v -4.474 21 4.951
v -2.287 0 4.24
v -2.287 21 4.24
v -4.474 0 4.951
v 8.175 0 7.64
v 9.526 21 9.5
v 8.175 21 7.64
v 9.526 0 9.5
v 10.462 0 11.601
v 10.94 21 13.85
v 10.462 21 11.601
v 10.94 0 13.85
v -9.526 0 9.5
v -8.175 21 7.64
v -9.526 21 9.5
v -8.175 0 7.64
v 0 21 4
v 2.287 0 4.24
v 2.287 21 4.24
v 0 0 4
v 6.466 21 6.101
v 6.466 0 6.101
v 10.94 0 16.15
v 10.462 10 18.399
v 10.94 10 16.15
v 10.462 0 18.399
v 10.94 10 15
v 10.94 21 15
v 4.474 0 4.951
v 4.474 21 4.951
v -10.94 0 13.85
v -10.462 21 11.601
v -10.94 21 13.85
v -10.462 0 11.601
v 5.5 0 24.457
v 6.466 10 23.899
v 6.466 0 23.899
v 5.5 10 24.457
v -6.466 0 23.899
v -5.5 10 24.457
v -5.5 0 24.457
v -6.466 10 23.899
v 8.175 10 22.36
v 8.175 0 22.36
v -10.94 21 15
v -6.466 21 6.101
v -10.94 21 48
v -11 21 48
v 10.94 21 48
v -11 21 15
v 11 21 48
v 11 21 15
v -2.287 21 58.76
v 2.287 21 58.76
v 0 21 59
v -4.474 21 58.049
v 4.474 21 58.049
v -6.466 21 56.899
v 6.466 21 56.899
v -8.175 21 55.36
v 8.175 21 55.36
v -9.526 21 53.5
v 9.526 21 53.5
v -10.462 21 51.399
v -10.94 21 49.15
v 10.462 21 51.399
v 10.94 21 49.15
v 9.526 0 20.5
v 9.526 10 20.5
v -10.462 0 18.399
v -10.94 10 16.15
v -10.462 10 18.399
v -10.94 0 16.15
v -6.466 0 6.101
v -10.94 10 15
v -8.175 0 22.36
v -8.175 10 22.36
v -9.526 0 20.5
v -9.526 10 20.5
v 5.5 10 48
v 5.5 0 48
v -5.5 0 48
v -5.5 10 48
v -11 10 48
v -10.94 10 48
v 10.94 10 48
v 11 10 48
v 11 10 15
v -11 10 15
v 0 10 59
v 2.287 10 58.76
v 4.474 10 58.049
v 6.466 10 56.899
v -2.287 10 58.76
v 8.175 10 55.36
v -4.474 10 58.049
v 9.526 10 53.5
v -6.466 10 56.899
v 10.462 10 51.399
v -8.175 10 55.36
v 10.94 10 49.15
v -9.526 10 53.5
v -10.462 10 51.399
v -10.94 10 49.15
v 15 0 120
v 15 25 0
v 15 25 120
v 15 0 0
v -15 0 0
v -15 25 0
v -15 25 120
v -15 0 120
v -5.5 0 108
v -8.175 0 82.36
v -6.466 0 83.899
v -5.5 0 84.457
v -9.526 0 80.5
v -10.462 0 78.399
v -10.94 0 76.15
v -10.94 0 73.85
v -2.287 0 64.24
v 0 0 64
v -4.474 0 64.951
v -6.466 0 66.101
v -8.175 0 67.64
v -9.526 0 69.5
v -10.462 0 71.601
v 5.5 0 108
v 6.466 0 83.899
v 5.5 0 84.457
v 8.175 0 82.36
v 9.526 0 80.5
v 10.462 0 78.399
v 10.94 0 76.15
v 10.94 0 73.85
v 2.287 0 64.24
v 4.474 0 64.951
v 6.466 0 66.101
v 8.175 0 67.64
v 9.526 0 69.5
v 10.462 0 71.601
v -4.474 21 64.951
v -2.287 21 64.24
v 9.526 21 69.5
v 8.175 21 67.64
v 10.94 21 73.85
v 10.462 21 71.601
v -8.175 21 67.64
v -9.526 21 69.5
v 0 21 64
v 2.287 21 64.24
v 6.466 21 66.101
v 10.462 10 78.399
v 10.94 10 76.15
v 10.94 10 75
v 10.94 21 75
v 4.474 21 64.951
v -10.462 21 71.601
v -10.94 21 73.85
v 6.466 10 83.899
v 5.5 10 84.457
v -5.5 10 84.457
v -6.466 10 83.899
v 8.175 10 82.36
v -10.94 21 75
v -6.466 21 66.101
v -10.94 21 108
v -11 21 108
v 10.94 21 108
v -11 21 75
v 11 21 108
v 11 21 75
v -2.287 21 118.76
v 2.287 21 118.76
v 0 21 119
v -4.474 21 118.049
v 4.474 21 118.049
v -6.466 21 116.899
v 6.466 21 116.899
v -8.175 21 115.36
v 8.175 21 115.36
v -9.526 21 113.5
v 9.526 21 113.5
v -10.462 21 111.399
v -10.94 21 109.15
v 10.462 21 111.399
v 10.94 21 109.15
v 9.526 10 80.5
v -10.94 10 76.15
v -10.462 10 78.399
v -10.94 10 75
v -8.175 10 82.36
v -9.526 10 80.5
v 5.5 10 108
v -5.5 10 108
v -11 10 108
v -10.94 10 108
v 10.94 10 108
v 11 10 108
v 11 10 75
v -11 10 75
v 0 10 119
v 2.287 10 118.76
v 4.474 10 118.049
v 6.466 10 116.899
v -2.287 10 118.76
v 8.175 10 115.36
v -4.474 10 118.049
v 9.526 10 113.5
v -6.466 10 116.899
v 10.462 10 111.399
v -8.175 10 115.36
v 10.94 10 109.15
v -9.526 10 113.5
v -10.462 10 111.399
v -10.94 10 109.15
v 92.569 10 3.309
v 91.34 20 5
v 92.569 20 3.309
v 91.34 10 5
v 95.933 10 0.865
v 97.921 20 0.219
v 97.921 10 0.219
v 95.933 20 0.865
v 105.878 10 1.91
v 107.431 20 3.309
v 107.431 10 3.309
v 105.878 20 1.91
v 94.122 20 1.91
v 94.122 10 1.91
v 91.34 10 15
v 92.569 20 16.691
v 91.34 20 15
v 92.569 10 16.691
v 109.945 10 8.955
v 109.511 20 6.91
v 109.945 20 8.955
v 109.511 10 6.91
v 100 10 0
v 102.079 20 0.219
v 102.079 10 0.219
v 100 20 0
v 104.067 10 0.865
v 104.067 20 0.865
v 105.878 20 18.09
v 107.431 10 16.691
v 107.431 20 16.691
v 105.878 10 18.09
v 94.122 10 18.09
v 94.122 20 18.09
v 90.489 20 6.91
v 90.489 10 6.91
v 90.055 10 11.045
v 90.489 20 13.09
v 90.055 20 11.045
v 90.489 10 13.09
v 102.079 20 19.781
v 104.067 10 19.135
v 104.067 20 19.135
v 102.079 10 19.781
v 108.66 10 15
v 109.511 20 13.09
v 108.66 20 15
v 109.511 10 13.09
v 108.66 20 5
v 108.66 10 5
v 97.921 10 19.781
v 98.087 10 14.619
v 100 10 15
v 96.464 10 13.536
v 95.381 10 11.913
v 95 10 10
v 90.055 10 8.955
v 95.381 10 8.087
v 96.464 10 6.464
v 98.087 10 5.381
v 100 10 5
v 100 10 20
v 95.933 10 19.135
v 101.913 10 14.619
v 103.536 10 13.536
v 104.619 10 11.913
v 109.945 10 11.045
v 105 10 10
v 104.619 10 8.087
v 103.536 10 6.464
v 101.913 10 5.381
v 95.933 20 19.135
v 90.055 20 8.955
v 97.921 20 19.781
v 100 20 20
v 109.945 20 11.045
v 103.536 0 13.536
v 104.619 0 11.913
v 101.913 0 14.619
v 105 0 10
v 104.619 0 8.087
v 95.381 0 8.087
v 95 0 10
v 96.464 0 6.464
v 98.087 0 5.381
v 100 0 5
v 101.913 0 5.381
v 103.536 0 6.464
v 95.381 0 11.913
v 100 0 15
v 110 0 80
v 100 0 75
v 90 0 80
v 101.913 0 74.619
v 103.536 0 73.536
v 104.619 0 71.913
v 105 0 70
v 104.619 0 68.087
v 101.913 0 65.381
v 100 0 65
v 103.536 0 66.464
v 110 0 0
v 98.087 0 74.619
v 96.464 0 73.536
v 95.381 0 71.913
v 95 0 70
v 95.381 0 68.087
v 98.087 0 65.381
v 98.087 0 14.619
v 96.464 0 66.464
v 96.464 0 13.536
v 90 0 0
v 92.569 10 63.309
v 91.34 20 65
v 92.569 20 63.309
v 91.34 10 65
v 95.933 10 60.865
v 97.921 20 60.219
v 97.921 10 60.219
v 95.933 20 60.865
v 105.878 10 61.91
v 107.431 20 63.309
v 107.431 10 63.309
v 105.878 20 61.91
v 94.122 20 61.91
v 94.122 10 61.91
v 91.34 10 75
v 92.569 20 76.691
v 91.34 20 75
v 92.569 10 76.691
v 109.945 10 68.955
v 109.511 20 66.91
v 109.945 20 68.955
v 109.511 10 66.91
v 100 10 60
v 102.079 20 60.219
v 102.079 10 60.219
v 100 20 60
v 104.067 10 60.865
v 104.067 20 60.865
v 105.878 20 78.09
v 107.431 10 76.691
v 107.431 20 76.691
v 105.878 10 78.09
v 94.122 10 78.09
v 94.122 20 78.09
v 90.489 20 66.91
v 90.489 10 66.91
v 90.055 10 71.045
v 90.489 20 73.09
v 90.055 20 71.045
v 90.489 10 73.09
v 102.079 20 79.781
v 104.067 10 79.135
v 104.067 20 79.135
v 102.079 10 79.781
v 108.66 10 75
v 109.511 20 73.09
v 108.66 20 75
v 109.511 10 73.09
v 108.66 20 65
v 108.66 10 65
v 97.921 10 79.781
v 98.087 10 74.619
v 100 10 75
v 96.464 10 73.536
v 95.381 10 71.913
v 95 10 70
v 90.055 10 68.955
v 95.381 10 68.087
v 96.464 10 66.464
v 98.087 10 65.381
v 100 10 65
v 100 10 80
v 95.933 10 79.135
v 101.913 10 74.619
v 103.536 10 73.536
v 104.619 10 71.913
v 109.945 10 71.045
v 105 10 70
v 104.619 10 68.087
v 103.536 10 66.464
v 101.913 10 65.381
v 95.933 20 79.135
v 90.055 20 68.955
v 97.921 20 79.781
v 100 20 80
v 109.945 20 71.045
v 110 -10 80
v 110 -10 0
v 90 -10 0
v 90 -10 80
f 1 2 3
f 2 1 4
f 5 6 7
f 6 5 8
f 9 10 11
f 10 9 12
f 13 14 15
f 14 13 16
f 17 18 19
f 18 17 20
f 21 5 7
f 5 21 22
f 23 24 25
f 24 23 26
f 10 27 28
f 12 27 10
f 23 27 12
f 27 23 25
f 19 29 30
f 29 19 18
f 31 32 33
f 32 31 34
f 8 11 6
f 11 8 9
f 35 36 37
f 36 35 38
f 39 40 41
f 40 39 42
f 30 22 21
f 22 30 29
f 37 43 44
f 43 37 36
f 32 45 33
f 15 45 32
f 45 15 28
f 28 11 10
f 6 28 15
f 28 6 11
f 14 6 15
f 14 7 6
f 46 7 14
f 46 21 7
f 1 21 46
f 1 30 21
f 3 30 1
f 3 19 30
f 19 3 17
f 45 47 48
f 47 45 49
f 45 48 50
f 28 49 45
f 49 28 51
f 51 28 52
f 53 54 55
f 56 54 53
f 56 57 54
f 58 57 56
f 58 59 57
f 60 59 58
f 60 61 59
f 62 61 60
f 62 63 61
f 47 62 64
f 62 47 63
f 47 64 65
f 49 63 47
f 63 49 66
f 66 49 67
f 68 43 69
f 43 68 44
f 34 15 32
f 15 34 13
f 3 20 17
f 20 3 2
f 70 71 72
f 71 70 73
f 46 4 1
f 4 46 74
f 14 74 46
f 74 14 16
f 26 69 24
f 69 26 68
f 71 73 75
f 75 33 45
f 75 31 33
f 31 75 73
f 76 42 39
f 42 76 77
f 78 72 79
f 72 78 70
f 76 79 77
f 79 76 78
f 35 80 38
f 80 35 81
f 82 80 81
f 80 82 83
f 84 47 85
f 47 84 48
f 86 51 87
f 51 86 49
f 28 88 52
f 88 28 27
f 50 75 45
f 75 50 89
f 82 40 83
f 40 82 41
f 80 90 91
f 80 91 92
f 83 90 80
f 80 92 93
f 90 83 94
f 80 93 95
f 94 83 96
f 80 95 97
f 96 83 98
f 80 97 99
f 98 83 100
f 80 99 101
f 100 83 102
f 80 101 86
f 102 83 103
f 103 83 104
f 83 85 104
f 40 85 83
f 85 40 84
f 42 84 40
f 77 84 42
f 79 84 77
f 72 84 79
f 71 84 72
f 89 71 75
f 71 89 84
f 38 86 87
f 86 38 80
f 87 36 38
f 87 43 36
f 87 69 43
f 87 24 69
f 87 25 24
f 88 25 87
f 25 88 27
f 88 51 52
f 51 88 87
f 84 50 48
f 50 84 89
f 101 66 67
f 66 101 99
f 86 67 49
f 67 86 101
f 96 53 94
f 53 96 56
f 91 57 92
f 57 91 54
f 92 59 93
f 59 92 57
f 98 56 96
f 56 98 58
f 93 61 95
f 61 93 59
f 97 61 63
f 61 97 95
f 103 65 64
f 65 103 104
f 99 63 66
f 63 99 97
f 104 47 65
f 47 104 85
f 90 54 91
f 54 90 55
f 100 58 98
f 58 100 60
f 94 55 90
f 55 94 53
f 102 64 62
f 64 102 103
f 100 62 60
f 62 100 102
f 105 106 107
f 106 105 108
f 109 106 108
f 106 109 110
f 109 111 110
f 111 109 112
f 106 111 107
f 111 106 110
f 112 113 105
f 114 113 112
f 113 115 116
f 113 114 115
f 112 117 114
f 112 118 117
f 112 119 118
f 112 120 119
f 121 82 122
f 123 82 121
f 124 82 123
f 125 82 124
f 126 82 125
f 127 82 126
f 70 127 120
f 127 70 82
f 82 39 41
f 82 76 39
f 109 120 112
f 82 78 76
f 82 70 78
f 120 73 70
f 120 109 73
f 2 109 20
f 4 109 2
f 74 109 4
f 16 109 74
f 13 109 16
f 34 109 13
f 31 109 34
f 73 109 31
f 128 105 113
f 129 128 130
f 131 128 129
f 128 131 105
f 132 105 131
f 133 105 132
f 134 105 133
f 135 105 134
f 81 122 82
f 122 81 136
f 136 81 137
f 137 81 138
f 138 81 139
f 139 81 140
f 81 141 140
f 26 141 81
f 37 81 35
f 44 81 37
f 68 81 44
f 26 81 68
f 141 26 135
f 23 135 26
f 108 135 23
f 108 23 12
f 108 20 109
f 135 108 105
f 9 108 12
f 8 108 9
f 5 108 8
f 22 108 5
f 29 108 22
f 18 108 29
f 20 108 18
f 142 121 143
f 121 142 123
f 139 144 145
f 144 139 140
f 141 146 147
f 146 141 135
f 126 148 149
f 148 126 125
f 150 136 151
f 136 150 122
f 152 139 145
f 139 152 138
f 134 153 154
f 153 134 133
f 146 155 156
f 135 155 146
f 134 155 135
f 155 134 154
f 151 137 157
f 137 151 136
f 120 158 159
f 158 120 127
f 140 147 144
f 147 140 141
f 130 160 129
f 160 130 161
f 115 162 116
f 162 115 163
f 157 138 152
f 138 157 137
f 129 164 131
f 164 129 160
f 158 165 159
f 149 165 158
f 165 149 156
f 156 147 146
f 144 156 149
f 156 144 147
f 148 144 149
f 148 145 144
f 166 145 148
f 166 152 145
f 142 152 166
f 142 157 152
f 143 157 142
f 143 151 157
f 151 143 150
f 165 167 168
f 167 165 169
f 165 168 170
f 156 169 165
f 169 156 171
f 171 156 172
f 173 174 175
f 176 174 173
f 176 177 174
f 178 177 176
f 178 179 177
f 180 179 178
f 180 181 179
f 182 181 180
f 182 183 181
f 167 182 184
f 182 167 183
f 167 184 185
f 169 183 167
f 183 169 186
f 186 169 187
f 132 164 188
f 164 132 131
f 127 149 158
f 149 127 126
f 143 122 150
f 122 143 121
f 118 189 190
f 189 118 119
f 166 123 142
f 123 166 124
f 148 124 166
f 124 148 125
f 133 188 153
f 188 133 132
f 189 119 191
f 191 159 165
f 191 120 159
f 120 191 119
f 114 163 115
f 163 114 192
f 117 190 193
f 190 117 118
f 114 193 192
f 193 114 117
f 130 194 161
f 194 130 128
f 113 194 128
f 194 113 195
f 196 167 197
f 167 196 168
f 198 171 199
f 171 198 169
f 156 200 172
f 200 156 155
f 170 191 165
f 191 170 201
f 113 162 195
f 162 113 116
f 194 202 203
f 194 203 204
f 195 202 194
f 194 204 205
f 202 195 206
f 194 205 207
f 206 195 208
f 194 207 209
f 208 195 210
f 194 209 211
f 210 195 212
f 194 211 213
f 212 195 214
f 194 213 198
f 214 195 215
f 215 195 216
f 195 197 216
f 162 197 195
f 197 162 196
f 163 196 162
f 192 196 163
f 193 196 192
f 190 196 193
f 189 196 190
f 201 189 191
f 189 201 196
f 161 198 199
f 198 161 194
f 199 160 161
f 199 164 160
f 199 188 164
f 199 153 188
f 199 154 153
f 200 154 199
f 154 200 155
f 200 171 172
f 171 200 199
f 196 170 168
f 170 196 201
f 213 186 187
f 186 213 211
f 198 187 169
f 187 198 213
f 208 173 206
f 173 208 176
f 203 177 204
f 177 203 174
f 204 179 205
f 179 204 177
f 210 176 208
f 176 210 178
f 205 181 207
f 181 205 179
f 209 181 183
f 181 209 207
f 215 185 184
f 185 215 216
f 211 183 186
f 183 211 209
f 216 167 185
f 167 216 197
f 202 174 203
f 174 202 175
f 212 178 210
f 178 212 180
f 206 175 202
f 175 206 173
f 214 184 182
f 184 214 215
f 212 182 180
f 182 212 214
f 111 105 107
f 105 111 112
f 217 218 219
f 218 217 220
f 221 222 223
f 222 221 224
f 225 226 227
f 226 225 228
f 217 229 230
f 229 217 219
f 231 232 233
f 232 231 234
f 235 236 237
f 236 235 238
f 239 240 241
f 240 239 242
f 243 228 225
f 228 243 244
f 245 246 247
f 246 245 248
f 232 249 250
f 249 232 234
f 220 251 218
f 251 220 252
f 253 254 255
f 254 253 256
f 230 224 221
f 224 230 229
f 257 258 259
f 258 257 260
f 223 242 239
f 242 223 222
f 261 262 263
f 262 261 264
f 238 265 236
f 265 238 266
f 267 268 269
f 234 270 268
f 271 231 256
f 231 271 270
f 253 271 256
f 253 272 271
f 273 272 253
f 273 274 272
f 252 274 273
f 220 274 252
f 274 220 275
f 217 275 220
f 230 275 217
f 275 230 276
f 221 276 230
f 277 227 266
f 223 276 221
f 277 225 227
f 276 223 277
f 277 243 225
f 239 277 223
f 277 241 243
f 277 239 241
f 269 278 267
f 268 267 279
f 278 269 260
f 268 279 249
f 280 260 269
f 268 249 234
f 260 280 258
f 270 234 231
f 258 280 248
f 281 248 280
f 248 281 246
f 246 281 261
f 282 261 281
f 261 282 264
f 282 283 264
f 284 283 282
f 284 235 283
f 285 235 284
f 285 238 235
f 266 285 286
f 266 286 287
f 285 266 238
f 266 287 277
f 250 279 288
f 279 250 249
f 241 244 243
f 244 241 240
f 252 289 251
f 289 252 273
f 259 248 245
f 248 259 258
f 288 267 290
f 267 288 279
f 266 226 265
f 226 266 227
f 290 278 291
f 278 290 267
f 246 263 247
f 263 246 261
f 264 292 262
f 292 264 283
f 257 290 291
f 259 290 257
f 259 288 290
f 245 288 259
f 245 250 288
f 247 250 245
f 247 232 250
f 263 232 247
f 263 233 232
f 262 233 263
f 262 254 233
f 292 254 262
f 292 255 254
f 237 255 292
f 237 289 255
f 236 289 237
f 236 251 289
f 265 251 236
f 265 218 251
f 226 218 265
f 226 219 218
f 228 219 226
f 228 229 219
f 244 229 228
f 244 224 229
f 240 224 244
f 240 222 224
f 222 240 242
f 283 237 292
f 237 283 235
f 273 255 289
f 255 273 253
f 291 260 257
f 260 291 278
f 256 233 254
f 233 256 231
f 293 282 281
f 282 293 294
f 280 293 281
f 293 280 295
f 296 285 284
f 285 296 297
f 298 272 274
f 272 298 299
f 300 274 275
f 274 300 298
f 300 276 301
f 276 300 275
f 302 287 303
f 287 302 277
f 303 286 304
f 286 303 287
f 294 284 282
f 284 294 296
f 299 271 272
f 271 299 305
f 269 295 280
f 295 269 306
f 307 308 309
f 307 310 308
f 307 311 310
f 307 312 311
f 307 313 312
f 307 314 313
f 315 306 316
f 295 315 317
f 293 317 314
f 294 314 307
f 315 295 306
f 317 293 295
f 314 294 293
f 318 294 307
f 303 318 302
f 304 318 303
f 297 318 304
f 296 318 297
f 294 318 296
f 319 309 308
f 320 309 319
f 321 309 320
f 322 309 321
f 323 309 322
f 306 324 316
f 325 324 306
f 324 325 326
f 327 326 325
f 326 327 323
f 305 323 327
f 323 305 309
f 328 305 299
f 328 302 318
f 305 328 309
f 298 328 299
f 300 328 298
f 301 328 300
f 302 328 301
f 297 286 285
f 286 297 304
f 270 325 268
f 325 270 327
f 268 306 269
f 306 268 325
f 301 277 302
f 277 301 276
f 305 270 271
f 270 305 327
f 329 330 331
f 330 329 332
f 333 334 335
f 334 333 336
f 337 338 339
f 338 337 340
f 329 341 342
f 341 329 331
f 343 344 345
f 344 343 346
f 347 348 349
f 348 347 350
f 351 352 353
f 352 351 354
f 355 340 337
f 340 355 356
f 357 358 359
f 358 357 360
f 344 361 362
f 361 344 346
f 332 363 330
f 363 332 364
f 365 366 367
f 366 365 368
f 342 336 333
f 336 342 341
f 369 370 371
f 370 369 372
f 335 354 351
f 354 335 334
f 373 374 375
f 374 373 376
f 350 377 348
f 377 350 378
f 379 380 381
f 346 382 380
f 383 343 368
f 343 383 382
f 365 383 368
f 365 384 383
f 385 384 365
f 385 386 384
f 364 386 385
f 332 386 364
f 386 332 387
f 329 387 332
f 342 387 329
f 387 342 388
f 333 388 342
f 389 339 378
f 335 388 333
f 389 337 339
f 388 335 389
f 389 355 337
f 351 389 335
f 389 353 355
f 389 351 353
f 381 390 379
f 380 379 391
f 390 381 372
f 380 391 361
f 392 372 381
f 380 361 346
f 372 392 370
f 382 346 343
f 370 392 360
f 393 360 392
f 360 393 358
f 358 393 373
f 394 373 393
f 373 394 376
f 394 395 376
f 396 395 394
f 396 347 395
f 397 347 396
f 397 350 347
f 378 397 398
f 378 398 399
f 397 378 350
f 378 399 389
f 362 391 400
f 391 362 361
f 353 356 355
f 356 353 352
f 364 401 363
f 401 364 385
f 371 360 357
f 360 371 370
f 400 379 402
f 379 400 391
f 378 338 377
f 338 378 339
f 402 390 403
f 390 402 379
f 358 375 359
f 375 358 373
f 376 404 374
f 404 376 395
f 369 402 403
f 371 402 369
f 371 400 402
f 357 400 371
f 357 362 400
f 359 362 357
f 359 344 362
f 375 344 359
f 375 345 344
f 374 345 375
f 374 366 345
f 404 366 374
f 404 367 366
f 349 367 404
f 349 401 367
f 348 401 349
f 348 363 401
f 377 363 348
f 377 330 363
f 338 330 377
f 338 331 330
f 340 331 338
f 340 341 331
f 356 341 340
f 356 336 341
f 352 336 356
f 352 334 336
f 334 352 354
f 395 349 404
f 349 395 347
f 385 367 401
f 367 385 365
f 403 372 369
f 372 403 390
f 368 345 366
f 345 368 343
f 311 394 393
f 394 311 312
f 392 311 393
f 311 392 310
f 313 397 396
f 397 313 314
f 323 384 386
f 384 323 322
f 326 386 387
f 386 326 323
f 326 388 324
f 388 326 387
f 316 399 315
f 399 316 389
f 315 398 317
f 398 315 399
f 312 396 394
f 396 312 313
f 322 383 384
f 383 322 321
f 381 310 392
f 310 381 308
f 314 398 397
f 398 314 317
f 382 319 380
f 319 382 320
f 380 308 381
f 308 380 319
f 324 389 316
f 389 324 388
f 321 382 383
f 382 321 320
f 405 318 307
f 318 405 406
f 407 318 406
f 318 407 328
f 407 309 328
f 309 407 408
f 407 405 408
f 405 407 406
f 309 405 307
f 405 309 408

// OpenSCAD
lockDiskRadius=10;

// cube lock cases
// cube([width,depth,height], center)
// cube([lockDiskRadius * 2.5, 10, lockCasingHeight]);

// lock insert
module lockCavity(keyRadius) {
    // calculated diskRadius to give tolerance
    calcDiskRadius = keyRadius + 1;
    //entryway
    rotate([90,90,0]) {
        translate([0,0,-calcDiskRadius]){
            cylinder(calcDiskRadius * 2, calcDiskRadius, calcDiskRadius);
        }
    }
    // front slot
    translate([-calcDiskRadius/2,-calcDiskRadius,0]) {
        cube([calcDiskRadius, calcDiskRadius, calcDiskRadius*3]);
    }
    
    //inner verticle
    translate([-calcDiskRadius, 0, 0]) {
        cube([calcDiskRadius*2, calcDiskRadius, calcDiskRadius*3]);
    }
    rotate([90,90,0]) {
        translate([-calcDiskRadius*3, 0, -calcDiskRadius]) {
            cylinder(calcDiskRadius, calcDiskRadius, calcDiskRadius);
        }
    }
};

module tooth(diskRadius)  {
    rotate([90,90,0]) {
        translate([0,0,-diskRadius]){
            cylinder(diskRadius, diskRadius, diskRadius);
        }
    }
    rotate([90, 90, 0]) {
        cylinder(diskRadius, diskRadius/2, diskRadius/2);
    }
}

module lock(diskRadius, numInserts) {
    height = diskRadius * 6;
    for (i = [0:numInserts - 1]) {
        difference() {
            translate([-diskRadius*1.5, 0, height*i]) {
                cube([diskRadius*3, diskRadius*2.5, height]);
            }
            translate([0, diskRadius, diskRadius*1.5 + height * i]) {
                lockCavity(diskRadius);
            }
        }
    }
}

module key(diskRadius, numTeeth) {
    gap = diskRadius*4;
    height = diskRadius*2;
    width = diskRadius*2;
    depth = diskRadius;
    for (i = [0:numTeeth-1]) {
        translate([0, diskRadius, diskRadius + gap * i + height*i]) {
            tooth(lockDiskRadius);
        }
        
        translate([-width*0.5, -depth, (height + gap) * i]) {
            cube([width, depth, height]);
        }
        if (i < numTeeth-1) {
            translate([-width*0.5, -depth, (height + gap) * i + height]) {
                cube([width, depth, gap]);
            }
        }
    }
}

lock(10, 2);
translate([100, 0, 0])
    key(10, 2);
